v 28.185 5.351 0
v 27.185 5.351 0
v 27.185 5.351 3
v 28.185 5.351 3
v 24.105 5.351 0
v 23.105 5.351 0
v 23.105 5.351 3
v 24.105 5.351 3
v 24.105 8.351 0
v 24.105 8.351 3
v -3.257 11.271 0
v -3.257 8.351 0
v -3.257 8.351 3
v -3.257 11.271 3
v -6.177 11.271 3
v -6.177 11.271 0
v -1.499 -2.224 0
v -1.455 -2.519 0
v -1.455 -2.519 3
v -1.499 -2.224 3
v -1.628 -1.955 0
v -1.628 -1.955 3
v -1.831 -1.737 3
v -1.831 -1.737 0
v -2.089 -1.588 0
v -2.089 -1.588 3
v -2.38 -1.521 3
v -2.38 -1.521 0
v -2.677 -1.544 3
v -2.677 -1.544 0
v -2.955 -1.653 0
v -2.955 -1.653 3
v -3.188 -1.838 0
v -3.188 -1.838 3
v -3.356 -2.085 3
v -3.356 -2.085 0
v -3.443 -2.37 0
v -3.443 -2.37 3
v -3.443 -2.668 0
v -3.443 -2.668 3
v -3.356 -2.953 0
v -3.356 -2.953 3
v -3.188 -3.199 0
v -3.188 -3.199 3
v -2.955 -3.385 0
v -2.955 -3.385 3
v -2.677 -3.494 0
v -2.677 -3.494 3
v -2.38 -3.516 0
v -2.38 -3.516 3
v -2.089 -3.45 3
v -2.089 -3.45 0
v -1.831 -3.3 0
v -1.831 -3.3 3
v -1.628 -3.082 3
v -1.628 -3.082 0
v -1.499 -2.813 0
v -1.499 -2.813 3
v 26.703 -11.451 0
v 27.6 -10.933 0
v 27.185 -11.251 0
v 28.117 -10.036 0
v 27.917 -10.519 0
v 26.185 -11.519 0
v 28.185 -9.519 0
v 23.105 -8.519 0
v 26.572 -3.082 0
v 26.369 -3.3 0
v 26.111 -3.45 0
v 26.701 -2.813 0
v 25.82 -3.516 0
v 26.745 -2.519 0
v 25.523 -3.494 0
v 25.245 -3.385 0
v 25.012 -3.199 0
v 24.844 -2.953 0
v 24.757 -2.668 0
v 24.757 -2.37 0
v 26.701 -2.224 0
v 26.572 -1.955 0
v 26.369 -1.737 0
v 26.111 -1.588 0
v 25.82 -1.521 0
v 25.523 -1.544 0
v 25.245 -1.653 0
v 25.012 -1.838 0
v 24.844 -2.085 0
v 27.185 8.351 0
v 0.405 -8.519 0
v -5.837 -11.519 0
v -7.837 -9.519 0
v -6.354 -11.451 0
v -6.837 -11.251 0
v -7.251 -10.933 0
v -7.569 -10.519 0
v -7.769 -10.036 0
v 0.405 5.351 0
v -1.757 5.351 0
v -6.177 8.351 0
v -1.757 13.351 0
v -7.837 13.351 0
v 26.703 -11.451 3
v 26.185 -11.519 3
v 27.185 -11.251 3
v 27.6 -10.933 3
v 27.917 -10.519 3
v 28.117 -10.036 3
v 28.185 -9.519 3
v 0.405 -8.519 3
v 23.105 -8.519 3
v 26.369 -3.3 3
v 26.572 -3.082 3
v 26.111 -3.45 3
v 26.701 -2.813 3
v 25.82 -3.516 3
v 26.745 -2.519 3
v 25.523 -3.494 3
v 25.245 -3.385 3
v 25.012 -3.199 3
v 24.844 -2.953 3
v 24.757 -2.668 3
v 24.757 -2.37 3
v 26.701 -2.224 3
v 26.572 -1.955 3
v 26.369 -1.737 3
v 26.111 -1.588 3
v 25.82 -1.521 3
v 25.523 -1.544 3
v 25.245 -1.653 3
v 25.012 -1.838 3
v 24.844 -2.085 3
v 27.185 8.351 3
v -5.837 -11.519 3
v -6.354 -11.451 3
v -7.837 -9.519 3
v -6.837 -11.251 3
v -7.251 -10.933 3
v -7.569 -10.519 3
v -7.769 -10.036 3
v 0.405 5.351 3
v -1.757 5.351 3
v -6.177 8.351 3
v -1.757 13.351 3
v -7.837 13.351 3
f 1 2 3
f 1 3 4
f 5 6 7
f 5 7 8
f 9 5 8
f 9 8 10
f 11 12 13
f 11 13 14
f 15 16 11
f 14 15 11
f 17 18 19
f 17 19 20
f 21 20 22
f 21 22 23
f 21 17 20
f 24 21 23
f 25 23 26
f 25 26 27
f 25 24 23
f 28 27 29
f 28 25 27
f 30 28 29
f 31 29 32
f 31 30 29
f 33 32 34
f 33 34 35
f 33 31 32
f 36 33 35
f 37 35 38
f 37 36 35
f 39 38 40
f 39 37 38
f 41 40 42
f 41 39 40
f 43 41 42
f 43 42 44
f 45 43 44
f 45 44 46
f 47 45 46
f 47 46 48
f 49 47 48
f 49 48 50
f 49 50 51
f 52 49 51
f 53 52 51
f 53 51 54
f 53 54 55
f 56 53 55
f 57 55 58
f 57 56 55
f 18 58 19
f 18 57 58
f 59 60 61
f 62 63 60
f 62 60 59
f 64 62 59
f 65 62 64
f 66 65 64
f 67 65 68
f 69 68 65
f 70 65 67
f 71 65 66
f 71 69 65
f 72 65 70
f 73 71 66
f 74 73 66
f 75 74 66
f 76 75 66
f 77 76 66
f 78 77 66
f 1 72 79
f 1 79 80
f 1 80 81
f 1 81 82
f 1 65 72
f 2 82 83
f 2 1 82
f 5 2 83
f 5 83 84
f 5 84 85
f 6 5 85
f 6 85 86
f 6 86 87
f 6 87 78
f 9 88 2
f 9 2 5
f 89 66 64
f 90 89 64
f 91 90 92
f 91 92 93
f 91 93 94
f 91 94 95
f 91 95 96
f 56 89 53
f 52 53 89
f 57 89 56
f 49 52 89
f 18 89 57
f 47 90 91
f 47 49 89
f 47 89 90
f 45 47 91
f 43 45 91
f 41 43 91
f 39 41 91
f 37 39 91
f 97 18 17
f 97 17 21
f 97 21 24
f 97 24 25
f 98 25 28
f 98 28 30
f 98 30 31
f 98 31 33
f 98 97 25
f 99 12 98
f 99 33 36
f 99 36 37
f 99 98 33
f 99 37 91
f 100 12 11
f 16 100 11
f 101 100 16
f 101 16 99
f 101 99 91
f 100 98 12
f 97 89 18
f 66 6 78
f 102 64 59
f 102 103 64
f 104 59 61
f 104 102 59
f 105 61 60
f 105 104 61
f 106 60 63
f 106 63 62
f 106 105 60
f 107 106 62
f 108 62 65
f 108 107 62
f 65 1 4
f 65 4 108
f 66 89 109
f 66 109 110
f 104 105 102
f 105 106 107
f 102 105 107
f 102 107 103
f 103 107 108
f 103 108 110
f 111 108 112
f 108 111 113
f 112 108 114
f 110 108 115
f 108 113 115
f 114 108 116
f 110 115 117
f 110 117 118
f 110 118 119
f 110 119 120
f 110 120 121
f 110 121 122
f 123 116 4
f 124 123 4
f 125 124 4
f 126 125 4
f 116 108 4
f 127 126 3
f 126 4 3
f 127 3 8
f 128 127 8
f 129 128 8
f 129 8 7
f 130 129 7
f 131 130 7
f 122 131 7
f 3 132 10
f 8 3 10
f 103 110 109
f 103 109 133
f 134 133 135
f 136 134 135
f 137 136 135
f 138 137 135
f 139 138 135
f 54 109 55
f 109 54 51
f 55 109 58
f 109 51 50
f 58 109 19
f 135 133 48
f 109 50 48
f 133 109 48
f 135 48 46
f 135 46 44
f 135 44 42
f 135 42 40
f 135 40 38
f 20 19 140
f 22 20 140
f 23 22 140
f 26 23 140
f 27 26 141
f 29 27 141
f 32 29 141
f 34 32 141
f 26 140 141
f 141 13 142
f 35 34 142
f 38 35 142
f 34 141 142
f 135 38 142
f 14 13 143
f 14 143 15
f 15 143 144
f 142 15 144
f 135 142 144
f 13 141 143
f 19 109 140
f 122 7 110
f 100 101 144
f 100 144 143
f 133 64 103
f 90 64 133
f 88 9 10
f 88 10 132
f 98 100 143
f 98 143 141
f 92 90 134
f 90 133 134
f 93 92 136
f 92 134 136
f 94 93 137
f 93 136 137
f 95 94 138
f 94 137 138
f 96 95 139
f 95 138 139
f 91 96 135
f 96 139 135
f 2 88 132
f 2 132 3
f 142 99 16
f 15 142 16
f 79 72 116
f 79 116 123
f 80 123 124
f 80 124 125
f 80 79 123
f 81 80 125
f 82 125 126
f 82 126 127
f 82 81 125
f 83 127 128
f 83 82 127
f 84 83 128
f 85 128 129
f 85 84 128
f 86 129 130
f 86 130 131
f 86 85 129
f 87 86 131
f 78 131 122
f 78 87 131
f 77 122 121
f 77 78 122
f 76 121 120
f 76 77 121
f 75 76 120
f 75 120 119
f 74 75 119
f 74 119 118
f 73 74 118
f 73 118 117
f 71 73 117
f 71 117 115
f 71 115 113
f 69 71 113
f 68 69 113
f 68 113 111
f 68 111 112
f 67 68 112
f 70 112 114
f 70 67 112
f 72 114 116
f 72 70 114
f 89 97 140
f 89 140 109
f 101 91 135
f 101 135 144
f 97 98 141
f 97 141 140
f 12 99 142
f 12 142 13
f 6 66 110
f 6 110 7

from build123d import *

# Parameters (mm, degrees)
SKETCH1_R           = 1
SKETCH1_W           = 2.92
SKETCH1_H           = 2.92
BOSS_EXTRUDE1_DEPTH = 3
FILLET1_R           = 2


with BuildPart() as part:
    # Sketch1 → Boss-Extrude1 (new body)
    with BuildSketch(Plane.XY):
        Polygon((28.185405405, -11.518648649), (-7.836756757, -11.518648649), (-7.836756757, 13.351351351), (-1.756756757, 13.351351351), (-1.756756757, 5.351351351), (0.405405405, 5.351351351), (0.405405405, -8.518648649), (23.105405405, -8.518648649), (23.105405405, 5.351351351), (24.105405405, 5.351351351), (24.105405405, 8.351351351), (27.185405405, 8.351351351), (27.185405405, 5.351351351), (28.185405405, 5.351351351), align=None)
        with Locations((-2.454594595, -2.518648649)):
            Circle(SKETCH1_R, mode=Mode.SUBTRACT)
        with Locations((25.745405405, -2.518648649)):
            Circle(SKETCH1_R, mode=Mode.SUBTRACT)
        with Locations((-4.716756757, 9.811351351)):
            Rectangle(SKETCH1_W, SKETCH1_H, mode=Mode.SUBTRACT)
    extrude(amount=BOSS_EXTRUDE1_DEPTH)

    # Fillet1
    fillet1_edges = [part.edges().sort_by_distance(p)[0] for p in [
        (28.185405405, -11.518648649, 1.5),
        (-7.836756757, -11.518648649, 1.5),
    ]]
    fillet(fillet1_edges, radius=FILLET1_R)


solid = part.part
